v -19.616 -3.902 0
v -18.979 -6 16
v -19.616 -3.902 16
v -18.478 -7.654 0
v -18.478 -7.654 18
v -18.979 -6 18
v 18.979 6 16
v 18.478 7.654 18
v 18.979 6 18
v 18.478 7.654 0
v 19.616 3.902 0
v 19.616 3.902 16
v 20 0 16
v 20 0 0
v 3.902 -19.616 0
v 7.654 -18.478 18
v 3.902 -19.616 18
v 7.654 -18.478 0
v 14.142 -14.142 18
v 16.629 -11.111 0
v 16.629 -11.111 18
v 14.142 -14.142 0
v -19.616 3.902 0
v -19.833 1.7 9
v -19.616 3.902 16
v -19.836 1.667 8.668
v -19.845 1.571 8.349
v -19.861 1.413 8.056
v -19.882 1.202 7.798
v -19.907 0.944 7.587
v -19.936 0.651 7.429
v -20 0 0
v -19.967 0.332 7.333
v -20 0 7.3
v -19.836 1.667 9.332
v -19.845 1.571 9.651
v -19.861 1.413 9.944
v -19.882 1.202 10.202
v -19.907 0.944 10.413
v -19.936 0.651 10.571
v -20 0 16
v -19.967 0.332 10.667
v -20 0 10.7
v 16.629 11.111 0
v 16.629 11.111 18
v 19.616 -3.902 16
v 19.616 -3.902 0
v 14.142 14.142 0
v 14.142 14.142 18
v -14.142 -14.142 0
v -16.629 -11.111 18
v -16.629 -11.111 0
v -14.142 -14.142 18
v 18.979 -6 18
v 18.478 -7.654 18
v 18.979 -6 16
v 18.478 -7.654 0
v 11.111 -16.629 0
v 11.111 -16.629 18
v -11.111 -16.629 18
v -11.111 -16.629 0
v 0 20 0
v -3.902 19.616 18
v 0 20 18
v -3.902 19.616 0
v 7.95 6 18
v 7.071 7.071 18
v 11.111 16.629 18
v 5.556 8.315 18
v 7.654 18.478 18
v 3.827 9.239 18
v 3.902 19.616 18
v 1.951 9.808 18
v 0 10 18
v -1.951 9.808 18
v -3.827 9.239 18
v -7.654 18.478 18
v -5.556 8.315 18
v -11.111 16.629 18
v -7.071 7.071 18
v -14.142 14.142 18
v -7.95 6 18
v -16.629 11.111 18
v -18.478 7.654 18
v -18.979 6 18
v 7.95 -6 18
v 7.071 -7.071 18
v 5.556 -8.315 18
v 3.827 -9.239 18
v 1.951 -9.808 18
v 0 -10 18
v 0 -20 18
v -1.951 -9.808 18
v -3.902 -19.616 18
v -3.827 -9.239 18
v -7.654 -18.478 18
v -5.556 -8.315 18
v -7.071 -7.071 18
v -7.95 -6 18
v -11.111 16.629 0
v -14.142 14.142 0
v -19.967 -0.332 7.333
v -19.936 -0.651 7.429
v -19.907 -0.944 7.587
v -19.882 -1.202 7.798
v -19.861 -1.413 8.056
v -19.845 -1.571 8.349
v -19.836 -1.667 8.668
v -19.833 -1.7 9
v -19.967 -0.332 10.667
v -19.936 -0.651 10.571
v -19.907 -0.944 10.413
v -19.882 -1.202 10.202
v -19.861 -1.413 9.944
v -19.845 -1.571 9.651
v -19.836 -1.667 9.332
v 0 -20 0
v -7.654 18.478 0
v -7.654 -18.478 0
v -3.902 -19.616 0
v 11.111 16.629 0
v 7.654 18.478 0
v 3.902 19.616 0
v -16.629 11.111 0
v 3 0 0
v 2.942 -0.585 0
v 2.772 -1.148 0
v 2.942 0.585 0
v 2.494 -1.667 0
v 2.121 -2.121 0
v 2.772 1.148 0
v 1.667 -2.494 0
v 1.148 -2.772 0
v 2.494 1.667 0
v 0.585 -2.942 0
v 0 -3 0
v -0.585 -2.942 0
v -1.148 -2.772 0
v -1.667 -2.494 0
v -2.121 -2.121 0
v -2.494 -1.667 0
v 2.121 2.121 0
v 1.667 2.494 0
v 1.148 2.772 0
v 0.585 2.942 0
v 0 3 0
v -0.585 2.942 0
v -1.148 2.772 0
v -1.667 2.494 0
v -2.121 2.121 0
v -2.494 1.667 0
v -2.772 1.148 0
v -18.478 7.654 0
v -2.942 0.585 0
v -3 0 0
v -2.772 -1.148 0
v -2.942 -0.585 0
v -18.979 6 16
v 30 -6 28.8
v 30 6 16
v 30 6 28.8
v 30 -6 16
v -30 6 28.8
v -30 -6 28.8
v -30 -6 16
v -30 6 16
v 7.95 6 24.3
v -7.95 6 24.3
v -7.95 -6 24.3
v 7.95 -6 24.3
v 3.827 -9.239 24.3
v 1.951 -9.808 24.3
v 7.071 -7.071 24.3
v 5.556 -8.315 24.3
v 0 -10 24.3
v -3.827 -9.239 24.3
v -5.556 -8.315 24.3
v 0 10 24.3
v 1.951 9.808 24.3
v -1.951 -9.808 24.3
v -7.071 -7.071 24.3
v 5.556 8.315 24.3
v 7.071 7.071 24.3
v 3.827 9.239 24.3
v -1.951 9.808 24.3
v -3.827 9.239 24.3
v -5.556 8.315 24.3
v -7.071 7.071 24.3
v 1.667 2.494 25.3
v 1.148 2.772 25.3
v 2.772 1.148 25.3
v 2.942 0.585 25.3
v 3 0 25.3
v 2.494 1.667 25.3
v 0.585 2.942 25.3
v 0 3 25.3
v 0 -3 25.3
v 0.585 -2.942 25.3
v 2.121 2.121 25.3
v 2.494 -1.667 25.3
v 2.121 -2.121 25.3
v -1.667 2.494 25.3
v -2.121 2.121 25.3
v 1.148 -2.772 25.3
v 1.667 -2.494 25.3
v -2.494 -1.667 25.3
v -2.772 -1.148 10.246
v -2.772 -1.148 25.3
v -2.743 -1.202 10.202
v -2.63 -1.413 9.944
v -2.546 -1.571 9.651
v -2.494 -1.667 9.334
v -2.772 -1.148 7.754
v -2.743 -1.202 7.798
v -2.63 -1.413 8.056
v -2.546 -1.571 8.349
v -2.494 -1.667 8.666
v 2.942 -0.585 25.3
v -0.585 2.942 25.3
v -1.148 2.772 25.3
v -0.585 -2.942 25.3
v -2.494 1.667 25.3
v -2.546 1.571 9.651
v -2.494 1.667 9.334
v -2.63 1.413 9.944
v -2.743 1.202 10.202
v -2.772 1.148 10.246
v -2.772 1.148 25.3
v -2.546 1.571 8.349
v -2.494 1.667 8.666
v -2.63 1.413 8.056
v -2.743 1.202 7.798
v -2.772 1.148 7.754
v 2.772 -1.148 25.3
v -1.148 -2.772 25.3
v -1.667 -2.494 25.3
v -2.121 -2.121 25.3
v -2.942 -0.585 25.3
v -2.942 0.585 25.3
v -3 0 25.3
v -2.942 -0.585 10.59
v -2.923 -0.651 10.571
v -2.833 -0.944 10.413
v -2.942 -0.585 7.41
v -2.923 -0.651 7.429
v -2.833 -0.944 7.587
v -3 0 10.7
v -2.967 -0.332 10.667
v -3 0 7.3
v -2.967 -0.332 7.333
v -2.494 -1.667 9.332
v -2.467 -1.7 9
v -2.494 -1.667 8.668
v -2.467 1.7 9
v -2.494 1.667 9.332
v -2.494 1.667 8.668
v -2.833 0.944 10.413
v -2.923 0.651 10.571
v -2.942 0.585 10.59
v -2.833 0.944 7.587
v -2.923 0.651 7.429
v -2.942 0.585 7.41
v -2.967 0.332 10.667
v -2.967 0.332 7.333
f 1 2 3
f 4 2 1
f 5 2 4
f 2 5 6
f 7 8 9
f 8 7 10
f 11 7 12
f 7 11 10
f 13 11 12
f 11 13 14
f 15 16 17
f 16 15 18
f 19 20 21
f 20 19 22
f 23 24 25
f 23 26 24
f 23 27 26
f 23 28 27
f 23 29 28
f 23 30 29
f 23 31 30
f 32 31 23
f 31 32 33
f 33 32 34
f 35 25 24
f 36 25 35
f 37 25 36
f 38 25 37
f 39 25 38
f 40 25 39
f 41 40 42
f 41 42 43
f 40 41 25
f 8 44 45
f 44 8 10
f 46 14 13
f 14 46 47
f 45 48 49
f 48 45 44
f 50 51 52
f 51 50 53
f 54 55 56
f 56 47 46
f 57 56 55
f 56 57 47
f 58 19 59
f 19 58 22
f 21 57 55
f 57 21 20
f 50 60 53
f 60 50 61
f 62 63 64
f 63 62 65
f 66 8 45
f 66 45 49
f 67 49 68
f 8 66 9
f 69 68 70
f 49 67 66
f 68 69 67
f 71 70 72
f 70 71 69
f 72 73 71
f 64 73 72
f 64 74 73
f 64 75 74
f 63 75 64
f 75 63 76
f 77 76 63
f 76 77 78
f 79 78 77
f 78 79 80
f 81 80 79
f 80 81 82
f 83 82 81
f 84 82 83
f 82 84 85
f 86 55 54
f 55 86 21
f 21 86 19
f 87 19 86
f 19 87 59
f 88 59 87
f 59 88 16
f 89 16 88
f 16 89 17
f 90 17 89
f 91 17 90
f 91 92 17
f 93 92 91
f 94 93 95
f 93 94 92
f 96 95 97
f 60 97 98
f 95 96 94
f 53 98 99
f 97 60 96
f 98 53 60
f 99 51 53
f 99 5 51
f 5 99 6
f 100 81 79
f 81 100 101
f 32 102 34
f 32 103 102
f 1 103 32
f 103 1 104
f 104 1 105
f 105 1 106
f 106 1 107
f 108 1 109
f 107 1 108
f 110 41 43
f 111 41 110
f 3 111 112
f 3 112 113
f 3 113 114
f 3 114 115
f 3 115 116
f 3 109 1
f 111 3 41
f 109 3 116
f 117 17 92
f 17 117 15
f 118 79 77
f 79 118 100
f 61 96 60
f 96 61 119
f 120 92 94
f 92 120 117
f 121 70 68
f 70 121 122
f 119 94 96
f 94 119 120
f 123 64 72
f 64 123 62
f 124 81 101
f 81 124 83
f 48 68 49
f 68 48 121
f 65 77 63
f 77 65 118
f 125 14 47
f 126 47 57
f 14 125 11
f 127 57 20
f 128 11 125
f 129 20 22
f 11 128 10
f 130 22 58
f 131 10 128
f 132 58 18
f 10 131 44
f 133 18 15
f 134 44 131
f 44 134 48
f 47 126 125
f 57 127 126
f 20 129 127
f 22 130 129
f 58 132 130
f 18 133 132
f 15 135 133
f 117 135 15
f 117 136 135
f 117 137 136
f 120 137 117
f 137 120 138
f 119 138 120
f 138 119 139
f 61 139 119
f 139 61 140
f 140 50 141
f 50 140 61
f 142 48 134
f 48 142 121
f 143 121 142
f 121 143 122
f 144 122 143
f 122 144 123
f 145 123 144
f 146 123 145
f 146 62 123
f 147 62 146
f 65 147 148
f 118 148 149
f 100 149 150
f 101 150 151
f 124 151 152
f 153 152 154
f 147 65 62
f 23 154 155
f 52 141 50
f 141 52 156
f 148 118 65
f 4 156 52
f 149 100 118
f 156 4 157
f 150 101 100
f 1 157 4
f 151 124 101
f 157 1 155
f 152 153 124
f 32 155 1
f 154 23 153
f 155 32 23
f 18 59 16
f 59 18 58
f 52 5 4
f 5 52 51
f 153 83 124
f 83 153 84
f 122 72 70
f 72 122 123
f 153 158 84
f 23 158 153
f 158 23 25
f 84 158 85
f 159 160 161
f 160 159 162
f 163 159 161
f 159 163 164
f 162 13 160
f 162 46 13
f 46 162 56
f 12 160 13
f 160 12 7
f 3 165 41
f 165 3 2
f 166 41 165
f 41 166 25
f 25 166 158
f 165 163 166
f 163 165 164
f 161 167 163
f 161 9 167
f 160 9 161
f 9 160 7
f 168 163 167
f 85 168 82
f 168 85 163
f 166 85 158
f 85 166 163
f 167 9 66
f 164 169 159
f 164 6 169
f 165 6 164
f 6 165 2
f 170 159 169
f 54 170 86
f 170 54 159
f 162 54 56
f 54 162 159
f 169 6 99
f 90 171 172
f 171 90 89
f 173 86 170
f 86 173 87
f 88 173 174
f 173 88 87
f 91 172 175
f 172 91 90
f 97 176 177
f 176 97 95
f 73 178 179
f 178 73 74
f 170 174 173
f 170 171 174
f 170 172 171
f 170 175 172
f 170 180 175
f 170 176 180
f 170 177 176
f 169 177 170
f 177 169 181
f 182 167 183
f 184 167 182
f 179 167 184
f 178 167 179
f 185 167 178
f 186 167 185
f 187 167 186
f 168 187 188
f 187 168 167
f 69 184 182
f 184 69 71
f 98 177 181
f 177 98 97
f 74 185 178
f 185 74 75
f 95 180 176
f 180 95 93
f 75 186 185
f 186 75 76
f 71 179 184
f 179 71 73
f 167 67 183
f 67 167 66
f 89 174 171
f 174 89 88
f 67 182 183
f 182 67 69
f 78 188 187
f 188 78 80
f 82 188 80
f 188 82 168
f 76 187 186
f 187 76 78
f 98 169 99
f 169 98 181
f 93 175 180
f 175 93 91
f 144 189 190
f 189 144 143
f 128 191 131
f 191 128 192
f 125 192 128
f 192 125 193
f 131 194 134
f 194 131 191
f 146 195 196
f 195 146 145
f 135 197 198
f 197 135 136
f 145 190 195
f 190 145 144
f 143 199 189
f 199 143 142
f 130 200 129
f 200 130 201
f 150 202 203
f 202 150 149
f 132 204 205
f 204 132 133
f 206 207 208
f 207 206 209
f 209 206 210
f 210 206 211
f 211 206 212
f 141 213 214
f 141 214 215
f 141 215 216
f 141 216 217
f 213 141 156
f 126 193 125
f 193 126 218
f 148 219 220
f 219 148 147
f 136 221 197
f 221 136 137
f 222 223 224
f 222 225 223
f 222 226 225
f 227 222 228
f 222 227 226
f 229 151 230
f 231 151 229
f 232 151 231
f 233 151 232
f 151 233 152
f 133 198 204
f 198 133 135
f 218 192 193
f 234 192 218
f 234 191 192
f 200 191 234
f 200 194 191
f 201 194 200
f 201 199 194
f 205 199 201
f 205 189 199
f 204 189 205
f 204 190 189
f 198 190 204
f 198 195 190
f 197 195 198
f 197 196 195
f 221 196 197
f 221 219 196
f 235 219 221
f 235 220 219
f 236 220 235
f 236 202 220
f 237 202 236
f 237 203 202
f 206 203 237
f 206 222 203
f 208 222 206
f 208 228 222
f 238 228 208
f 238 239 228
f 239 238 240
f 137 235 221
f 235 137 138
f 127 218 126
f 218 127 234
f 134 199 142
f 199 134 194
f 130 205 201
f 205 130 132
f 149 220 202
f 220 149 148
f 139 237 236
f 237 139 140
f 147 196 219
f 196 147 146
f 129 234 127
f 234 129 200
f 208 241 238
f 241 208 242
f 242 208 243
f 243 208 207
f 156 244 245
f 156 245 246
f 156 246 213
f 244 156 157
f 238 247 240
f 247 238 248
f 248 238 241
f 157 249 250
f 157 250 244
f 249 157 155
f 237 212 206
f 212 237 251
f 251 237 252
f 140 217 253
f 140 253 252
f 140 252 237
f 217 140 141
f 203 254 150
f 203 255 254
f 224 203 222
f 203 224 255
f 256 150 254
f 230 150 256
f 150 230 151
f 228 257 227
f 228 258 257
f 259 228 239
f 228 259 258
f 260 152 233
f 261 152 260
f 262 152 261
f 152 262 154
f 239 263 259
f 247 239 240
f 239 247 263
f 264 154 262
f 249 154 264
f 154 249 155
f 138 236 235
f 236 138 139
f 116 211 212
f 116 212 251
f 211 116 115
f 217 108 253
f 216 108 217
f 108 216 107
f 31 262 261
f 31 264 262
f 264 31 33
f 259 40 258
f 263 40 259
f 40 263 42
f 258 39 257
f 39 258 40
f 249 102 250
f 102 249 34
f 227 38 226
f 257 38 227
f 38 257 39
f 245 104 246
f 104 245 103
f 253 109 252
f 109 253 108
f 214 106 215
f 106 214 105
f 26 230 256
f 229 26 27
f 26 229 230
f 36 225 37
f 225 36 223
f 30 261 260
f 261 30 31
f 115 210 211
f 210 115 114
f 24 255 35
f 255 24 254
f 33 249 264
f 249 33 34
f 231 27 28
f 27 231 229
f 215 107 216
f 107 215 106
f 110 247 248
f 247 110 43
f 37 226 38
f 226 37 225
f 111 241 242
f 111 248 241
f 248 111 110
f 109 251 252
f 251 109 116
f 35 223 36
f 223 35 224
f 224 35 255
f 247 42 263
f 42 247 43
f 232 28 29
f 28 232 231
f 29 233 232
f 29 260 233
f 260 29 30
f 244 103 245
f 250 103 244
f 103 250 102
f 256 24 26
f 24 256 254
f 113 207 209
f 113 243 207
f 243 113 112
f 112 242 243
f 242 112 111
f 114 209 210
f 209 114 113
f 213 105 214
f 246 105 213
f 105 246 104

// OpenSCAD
$fn = 32;

// ----------------------------------------------------------------------
// Hand knob: 40 x 60 x 24.3 mm
// ----------------------------------------------------------------------

// --- parameters (mm) ---
knob_d = 40;              // knob diameter
knob_h = 18;              // knob height
bore_d = 6;               // shaft bore
set_d = 3.4;              // set screw tap hole
wing_l = 60;              // wing span
wing_w = 12;              // wing width
wing_h = 10.8;            // wing thickness
cap_h = 6.3;              // raised centre cap
cap_d = 20;               // centre cap diameter

module body() {
  cylinder(h = knob_h, d = knob_d);
}

module wing() {
  /* wing sunk 2 mm into the knob so the joint overlaps */
  translate([-wing_l / 2, -wing_w / 2, knob_h - 2])
    cube([wing_l, wing_w, wing_h + 2]);
}

module cap() {
  translate([0, 0, knob_h - 1]) cylinder(h = cap_h + 1, d = cap_d);
}

difference() {
  union() {
    body();
    wing();
    cap();
  }
  translate([0, 0, -1]) cylinder(h = knob_h + cap_h + 2, d = bore_d);
  translate([-knob_d / 2 - 1, 0, knob_h * 0.5]) rotate([0, 90, 0]) cylinder(h = knob_d / 2 + 2, d = set_d);
}
